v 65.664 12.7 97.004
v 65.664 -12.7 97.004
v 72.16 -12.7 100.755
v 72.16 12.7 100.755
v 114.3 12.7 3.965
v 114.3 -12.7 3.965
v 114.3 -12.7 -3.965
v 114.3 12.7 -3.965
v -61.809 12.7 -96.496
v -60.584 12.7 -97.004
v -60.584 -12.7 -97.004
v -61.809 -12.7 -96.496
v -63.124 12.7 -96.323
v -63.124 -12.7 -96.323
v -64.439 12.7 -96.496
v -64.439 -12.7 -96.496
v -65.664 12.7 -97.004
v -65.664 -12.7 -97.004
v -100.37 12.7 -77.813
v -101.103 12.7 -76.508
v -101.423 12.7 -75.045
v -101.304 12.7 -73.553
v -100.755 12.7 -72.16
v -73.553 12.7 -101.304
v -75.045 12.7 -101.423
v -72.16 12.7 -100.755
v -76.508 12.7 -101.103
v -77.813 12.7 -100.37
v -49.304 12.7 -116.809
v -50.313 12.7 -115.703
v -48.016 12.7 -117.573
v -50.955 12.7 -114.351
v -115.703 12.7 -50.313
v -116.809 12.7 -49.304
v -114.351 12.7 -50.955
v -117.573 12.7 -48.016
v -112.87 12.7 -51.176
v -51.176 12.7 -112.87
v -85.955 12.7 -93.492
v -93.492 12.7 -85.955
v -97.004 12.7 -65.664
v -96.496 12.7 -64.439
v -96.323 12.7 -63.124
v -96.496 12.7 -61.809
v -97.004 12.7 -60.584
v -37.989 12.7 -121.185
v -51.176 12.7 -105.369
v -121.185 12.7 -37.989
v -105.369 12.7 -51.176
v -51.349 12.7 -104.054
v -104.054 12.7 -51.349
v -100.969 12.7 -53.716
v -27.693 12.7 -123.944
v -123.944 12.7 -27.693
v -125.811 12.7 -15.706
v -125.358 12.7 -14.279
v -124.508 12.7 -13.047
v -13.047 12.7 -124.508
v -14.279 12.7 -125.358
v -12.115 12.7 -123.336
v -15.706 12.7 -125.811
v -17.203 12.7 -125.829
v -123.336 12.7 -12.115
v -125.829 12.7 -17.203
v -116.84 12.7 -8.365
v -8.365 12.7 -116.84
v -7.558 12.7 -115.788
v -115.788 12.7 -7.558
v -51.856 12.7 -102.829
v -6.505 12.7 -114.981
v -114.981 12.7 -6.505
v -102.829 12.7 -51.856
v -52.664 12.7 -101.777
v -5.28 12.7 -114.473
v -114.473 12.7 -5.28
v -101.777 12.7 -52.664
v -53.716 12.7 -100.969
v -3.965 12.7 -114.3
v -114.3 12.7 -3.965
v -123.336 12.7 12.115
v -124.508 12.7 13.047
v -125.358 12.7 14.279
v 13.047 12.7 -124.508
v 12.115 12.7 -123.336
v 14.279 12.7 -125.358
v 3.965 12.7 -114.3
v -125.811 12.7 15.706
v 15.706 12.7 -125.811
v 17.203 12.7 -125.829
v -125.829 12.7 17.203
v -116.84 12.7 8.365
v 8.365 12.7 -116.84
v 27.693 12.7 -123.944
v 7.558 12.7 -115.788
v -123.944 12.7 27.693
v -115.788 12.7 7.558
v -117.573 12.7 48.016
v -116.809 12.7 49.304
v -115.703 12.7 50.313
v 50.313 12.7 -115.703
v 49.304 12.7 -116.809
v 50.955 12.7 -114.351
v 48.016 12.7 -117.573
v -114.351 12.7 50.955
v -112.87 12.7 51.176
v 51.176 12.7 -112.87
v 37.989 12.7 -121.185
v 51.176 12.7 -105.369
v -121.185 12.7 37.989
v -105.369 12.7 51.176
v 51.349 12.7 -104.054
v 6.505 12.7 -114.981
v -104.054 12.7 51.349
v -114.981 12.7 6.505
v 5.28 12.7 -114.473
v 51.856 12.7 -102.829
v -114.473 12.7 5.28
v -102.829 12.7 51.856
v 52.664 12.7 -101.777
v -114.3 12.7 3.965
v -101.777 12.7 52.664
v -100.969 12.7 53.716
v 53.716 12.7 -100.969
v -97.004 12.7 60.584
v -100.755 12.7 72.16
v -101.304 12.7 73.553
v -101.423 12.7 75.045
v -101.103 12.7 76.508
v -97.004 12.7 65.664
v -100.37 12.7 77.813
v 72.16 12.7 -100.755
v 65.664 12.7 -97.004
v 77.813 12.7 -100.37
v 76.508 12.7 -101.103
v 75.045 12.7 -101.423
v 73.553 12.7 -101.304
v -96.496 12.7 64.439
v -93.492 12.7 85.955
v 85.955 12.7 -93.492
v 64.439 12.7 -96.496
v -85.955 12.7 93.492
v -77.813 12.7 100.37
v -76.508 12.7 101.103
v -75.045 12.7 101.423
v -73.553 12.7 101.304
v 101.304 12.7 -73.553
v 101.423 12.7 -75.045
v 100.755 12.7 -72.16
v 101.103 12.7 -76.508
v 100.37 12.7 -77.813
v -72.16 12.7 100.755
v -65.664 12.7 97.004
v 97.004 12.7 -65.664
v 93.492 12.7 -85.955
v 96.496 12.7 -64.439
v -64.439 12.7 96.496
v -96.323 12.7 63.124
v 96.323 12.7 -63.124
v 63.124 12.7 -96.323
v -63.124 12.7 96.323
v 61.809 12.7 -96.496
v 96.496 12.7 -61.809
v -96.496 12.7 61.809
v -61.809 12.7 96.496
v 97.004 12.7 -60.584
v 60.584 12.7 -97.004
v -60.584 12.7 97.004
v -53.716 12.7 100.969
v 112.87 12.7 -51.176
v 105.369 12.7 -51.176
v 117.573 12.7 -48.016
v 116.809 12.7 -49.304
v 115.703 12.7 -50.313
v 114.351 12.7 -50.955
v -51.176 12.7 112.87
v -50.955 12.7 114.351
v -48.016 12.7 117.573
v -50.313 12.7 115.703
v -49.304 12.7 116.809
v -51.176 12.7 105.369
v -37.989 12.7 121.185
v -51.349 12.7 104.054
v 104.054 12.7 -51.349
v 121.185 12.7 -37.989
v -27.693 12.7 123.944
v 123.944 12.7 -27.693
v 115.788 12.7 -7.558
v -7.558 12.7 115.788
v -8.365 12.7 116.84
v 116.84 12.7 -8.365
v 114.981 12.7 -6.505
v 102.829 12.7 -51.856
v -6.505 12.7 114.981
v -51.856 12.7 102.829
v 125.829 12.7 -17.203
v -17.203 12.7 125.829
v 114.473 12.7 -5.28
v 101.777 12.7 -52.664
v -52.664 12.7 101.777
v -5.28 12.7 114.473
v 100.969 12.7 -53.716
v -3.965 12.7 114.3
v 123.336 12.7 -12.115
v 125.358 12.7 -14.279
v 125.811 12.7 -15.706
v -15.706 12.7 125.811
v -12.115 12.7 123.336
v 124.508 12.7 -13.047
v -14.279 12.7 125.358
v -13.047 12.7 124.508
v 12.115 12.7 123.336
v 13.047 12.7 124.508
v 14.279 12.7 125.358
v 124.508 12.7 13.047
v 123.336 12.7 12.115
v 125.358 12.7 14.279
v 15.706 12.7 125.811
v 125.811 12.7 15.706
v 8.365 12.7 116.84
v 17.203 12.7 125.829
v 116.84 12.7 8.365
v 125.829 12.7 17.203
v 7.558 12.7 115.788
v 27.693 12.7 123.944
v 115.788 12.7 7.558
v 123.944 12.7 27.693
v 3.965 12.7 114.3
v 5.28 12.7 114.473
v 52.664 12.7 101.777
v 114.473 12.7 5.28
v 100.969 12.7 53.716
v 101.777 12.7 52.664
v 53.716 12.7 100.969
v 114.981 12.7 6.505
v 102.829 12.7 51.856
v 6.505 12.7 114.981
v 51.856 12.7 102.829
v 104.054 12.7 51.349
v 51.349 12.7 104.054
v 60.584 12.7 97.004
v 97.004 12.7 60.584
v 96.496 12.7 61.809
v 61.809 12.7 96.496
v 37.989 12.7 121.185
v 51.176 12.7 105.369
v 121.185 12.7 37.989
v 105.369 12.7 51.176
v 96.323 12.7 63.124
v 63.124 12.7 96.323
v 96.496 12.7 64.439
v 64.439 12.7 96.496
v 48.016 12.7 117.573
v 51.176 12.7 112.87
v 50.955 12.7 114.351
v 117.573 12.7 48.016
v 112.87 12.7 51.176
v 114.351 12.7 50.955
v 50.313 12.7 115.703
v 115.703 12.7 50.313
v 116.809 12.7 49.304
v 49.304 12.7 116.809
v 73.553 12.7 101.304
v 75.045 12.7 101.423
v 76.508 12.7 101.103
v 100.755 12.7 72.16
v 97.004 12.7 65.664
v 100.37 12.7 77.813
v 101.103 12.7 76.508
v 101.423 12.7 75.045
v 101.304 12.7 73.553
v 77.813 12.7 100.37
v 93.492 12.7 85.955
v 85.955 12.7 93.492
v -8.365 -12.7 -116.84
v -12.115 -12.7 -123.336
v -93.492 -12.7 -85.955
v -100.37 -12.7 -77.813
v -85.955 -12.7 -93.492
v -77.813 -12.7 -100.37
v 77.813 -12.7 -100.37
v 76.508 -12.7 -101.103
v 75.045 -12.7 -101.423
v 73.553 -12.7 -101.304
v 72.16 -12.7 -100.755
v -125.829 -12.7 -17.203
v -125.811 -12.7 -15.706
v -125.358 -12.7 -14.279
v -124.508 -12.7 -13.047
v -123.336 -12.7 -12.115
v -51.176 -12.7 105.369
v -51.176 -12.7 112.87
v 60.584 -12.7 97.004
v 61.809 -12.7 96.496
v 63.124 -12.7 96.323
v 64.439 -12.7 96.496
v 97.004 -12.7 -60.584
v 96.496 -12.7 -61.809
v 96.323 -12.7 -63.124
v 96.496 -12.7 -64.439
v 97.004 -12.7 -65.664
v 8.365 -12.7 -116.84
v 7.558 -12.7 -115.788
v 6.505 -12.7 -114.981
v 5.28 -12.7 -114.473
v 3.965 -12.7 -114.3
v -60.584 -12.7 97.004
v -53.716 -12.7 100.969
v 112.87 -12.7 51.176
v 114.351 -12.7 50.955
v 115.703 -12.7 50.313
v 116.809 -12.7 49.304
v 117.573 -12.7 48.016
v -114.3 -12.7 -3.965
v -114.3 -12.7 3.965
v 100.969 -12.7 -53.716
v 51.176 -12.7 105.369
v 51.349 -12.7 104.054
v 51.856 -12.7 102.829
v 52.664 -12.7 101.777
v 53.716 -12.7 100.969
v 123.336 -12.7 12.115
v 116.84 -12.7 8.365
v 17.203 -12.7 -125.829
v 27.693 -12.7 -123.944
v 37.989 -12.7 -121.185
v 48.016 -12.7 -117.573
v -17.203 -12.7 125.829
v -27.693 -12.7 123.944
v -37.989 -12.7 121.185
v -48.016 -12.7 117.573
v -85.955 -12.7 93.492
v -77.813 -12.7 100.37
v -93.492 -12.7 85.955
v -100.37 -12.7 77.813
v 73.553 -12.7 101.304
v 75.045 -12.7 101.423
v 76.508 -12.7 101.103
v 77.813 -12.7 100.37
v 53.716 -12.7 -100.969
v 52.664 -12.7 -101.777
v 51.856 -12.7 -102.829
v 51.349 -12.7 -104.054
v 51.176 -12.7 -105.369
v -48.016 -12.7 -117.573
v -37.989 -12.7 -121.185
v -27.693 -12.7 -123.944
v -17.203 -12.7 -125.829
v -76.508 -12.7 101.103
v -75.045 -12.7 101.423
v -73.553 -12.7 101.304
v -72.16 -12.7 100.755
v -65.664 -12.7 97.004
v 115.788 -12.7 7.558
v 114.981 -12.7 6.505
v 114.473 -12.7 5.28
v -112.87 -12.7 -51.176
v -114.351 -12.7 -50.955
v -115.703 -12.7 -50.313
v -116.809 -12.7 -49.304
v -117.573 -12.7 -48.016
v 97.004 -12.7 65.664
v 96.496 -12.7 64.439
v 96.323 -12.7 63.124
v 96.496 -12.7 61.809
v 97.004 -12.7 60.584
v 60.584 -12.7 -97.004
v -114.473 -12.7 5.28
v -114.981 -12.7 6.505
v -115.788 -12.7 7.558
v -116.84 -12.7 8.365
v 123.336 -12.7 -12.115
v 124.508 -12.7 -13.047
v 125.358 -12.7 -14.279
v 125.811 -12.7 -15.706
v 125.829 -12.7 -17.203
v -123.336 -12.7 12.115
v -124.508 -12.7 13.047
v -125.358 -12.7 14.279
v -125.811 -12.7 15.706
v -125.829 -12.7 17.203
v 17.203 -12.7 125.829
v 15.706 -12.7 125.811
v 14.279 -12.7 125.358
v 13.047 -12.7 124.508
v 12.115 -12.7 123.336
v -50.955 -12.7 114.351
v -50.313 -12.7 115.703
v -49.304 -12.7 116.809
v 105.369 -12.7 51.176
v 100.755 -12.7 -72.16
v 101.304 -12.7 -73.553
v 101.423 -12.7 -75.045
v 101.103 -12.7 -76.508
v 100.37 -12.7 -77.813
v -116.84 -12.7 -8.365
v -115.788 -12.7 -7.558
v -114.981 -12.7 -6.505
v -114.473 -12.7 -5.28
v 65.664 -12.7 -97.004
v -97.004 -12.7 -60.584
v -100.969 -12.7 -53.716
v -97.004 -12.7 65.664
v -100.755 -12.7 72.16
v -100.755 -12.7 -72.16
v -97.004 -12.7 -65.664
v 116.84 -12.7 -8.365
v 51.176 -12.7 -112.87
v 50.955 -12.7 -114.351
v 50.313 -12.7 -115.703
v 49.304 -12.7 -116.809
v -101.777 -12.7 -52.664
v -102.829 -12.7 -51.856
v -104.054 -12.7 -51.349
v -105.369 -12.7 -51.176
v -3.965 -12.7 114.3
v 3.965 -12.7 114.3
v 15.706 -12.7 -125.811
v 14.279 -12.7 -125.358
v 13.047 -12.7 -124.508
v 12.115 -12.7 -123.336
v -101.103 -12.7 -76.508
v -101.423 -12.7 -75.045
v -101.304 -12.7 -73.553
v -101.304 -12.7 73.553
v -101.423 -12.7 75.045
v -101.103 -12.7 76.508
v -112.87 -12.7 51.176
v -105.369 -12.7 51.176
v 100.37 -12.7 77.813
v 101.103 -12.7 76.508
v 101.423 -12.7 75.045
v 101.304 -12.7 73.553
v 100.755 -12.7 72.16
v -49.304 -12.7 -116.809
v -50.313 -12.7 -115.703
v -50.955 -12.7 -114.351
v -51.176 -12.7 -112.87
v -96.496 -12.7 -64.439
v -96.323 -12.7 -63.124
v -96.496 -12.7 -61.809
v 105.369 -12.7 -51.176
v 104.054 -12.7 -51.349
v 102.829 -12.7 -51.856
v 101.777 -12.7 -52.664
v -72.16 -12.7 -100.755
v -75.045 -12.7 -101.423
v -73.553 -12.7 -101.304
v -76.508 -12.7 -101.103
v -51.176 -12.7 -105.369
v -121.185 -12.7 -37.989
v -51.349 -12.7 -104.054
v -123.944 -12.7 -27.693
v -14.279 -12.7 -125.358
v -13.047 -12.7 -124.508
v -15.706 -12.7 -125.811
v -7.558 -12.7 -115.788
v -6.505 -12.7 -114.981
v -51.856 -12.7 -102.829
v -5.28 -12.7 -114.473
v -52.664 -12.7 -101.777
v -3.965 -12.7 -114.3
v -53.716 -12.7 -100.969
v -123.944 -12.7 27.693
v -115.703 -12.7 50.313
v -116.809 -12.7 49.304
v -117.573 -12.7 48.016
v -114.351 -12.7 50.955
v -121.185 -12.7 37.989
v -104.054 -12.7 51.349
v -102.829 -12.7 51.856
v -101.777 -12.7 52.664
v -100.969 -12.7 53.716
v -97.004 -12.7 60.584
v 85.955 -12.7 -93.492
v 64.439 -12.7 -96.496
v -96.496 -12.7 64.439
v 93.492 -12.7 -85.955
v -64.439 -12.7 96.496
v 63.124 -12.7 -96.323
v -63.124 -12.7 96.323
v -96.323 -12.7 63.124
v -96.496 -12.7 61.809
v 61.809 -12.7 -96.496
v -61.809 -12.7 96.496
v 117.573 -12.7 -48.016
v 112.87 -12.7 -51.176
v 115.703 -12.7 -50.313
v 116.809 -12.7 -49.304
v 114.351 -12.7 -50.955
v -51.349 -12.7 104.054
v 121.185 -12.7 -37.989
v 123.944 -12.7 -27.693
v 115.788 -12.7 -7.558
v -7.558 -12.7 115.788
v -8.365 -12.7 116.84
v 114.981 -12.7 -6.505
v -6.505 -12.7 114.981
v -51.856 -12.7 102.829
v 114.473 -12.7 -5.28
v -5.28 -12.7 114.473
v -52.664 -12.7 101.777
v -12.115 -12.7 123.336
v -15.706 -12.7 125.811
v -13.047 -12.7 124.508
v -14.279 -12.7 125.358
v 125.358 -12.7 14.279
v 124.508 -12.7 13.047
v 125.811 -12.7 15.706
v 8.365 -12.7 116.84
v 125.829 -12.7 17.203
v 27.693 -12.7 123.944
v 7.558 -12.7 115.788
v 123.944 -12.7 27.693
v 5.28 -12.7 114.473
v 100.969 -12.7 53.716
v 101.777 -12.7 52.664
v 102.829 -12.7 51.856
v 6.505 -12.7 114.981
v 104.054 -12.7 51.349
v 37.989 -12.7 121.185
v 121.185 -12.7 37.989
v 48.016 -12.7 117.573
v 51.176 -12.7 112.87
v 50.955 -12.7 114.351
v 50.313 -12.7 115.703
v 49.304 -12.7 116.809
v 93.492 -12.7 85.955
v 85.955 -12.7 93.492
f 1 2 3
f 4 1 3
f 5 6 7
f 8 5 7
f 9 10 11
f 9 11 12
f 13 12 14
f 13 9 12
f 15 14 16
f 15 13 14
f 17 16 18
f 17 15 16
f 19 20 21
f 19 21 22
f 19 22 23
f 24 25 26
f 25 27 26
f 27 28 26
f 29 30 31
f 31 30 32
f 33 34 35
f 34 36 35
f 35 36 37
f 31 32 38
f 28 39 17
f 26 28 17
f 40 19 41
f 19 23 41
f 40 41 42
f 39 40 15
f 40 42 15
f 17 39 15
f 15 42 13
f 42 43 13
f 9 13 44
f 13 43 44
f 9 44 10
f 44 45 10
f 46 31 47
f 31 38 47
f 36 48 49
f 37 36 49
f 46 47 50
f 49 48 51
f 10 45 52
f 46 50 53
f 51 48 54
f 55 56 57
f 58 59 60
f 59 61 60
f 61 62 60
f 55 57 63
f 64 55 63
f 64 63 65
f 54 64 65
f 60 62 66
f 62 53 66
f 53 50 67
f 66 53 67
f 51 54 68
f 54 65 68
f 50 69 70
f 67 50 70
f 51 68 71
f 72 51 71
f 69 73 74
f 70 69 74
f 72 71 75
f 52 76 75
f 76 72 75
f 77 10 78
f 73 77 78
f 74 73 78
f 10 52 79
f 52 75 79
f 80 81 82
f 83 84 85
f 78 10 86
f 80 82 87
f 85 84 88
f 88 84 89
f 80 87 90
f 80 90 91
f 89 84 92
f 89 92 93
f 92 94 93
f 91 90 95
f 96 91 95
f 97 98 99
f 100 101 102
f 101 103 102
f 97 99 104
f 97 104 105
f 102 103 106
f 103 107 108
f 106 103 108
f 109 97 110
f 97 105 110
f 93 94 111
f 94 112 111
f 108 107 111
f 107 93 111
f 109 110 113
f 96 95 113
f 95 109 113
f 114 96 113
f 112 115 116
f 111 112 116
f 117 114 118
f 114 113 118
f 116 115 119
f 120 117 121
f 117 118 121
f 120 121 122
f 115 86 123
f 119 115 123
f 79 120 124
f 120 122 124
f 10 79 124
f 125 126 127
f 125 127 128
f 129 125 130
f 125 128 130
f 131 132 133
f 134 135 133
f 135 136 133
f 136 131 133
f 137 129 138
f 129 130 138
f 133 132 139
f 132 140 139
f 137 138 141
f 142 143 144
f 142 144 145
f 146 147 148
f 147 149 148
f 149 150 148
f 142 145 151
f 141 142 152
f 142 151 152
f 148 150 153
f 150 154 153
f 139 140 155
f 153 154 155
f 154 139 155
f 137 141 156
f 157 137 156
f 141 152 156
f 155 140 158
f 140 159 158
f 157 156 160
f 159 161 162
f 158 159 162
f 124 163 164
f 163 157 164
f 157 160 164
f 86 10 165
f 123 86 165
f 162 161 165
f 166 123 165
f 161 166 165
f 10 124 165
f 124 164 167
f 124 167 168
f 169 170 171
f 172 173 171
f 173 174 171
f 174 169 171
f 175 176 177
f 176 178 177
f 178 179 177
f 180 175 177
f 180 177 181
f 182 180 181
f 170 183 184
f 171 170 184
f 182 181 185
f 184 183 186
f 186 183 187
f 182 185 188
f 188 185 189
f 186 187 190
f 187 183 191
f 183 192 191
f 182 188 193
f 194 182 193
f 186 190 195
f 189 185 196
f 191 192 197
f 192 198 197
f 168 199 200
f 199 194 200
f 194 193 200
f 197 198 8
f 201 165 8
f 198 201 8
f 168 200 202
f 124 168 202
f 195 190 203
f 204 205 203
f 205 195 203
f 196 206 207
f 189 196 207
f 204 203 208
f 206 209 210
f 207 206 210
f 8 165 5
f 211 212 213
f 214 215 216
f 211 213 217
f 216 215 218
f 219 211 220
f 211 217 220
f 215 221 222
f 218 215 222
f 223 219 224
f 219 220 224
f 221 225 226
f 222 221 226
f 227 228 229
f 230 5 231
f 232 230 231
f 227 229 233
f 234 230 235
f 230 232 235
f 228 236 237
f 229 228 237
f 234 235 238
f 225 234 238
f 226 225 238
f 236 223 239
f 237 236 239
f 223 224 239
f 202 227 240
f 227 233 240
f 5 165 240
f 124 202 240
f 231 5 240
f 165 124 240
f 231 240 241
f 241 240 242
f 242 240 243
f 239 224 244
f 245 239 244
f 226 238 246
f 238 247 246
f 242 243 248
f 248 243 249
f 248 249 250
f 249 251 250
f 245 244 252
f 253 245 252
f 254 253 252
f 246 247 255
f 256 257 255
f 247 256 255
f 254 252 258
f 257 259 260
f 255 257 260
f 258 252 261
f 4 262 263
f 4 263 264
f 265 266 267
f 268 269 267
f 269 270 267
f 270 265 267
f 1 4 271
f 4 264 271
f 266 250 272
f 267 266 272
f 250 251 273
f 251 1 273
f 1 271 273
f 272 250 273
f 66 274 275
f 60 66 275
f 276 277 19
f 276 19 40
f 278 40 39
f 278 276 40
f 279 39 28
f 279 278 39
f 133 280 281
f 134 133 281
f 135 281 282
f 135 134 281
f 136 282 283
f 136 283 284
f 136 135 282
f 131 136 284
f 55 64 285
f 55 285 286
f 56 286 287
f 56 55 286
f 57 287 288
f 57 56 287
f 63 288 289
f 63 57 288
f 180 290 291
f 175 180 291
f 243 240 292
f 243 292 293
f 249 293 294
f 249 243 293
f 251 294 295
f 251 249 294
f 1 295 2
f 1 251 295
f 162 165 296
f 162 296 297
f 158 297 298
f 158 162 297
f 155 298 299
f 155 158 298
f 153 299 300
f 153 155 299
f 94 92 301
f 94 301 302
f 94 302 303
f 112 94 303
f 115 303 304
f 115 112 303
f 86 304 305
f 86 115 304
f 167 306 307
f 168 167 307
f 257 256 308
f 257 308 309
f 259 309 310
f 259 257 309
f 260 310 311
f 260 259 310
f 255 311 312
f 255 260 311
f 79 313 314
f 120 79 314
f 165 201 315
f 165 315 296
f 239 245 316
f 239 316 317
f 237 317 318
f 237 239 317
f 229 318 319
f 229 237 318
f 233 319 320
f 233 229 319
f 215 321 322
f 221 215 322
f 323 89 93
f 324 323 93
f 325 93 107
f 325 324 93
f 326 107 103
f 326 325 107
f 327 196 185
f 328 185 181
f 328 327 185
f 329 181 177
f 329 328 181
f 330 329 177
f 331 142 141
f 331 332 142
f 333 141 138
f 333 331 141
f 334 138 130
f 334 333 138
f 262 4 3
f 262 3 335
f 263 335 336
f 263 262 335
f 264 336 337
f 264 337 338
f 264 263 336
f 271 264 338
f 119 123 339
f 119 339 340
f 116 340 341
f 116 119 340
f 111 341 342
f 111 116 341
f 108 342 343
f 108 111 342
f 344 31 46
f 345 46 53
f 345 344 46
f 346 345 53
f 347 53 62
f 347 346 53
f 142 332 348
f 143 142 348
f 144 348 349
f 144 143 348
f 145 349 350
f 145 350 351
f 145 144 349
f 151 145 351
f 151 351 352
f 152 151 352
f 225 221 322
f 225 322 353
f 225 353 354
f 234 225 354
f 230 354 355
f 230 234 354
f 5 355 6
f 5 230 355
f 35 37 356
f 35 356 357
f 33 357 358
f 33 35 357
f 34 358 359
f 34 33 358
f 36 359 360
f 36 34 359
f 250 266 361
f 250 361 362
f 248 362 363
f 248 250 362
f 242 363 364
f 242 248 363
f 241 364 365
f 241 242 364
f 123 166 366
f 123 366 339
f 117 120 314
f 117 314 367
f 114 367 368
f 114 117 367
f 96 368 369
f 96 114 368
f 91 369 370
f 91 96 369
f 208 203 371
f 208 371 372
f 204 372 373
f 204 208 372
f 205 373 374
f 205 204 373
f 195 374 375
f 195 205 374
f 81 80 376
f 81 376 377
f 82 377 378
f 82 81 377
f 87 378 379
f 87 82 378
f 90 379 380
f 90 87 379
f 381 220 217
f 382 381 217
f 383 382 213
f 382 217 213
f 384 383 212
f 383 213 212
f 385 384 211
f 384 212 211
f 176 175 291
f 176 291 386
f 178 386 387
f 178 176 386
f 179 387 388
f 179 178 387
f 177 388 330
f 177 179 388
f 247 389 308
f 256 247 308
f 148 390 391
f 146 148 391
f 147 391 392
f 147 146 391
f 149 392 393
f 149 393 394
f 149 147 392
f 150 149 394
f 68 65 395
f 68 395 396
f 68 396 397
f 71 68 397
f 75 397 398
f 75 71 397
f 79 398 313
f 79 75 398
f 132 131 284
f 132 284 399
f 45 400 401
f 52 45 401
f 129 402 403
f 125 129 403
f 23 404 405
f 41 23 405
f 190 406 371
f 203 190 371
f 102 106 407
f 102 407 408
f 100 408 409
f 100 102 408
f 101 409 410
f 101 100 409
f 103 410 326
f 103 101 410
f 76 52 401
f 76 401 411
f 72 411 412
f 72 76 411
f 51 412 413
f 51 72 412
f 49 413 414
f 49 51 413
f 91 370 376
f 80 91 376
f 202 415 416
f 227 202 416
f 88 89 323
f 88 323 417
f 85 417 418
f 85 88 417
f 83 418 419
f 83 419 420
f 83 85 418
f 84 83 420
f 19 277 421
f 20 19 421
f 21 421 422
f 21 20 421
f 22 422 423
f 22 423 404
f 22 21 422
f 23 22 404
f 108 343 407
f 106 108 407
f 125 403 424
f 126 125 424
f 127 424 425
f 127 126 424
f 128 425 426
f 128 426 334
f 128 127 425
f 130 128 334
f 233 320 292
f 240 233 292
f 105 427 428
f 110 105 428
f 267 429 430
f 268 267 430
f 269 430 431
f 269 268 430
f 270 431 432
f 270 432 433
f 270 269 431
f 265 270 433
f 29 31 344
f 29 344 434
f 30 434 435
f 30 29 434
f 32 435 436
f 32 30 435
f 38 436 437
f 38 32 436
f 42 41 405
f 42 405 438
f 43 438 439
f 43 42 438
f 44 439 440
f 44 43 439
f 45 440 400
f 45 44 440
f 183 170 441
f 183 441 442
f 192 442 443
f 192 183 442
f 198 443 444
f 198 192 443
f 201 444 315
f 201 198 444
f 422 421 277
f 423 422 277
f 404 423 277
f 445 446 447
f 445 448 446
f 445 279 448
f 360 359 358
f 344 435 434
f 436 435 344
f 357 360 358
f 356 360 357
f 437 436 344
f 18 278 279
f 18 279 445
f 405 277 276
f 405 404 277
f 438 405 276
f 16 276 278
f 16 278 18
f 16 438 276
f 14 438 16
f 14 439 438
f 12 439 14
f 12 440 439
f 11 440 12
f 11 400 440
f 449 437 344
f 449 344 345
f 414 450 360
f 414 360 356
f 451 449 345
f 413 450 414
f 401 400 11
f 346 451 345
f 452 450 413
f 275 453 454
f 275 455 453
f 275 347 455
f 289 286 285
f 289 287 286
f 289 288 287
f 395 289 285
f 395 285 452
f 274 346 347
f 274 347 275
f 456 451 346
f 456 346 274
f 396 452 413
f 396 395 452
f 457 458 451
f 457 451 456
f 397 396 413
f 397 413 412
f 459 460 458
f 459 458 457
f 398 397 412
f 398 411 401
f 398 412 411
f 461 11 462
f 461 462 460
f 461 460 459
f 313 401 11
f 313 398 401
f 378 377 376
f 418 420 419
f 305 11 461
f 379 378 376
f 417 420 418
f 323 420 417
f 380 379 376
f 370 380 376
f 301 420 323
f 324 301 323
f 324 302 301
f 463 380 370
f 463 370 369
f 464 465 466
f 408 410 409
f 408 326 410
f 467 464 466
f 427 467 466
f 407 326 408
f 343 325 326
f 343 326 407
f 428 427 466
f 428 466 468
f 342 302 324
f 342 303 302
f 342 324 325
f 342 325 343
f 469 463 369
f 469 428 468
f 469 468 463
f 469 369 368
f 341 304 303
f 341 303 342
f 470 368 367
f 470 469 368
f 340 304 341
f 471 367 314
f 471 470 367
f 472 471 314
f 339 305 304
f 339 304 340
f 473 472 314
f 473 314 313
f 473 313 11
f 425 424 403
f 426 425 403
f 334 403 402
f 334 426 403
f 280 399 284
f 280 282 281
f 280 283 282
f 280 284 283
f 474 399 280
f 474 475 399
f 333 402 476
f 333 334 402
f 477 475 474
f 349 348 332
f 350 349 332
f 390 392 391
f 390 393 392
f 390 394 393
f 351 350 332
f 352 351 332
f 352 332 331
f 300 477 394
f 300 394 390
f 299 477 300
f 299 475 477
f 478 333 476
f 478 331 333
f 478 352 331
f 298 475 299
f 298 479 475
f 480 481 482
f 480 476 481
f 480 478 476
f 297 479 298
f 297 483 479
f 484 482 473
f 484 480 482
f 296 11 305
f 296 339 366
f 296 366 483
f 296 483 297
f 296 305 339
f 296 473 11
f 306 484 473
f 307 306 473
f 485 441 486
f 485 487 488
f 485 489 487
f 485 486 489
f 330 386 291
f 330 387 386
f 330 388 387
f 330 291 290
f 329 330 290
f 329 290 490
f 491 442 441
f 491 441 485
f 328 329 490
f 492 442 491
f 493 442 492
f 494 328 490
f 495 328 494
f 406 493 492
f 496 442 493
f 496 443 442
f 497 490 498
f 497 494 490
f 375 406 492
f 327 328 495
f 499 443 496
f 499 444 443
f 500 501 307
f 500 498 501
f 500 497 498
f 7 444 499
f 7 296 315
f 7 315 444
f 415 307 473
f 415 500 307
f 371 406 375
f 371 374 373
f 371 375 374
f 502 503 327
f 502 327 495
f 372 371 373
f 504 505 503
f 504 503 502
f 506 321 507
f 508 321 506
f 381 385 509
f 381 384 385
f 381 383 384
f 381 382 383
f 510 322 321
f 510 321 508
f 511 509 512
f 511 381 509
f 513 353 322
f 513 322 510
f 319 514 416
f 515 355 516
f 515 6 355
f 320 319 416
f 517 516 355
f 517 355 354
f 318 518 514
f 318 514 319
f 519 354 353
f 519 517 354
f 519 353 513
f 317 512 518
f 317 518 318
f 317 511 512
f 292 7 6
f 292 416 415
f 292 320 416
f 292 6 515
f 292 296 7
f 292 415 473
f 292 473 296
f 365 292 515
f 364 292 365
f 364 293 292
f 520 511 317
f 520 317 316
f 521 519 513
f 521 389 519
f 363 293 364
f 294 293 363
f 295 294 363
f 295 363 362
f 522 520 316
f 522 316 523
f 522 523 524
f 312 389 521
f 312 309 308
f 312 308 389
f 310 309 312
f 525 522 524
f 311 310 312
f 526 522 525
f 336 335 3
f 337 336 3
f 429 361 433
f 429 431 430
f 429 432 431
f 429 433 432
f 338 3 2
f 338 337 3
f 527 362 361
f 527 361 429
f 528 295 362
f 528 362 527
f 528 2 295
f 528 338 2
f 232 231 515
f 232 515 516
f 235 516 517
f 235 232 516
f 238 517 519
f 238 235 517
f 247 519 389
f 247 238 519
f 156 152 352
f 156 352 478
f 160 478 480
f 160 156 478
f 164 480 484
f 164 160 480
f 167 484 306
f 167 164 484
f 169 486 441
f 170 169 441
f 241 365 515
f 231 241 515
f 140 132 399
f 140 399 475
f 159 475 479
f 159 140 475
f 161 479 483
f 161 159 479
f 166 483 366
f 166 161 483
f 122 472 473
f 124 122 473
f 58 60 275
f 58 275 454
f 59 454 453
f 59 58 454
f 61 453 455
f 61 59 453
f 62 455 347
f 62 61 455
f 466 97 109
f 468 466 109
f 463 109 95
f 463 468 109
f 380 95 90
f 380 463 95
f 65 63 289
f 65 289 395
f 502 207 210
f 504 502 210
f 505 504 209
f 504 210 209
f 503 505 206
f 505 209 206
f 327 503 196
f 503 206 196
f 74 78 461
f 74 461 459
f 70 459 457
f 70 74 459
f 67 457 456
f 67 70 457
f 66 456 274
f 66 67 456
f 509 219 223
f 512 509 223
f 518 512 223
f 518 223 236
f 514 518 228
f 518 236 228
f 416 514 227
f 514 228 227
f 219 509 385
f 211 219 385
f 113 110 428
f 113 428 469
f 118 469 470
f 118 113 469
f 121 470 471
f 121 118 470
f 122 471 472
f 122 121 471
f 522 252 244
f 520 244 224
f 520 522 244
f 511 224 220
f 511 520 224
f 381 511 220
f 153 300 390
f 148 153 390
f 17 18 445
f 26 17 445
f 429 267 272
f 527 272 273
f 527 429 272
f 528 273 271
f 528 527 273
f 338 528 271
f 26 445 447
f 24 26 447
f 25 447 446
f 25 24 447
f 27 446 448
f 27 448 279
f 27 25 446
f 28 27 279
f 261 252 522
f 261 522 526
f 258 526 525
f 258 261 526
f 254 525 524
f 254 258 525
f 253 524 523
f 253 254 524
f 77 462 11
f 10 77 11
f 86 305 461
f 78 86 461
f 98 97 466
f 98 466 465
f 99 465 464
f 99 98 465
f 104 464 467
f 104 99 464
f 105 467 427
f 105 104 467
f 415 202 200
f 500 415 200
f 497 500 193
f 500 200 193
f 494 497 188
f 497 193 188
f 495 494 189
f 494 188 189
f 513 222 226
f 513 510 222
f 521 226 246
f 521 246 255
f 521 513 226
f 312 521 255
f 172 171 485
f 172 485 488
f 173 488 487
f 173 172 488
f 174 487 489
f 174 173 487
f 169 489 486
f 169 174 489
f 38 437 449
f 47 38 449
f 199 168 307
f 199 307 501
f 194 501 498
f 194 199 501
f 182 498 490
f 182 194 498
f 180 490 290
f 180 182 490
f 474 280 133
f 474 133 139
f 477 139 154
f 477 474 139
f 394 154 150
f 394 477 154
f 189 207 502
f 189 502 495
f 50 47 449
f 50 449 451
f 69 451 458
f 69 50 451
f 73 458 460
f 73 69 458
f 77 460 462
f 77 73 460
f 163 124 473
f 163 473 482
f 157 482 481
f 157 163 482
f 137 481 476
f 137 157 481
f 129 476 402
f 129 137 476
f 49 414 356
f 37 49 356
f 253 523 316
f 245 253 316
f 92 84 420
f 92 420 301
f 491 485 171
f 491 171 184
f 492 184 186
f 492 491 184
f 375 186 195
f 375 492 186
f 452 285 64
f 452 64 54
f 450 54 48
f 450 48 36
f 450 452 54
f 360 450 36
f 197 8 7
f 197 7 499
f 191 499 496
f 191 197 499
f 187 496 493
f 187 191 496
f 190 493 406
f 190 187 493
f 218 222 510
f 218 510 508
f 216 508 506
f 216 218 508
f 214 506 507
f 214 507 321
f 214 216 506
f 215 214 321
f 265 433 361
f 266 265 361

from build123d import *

# Parameters (mm, degrees)
F0_R            = 127
F1_DEPTH        = 12.7
F3_DEPTH        = 12.701
F3_DEPTH_BACK   = 12.701
F3_COPIES_COUNT = 12
F4_T1_DEPTH     = 25.4
F4_T3_DEPTH     = 42.5595323233


# Not quite as in the source:
# - a fillet or chamfer that OpenCascade refuses, or shapes differently, is made with other operations: its cross-section is extruded or revolved along the edge and cut away or added
# - a feature of the source that left no trace in its solid (it failed there, or was rolled back) is left out
# - a pattern or mirror of a feature is missing from the dataset's text; its kind, count and spacing are read off the source's solid


with BuildPart() as f1:
    # F0 (on Front) → F1 (new body, symmetric)
    with BuildSketch(Plane.XZ):
        Circle(F0_R)
    extrude(amount=F1_DEPTH, both=True)

    # F2 (on Front) → F3 (cut, two sides)
    with BuildSketch(Plane.XZ) as f3_sk:
        with BuildLine():
            Line((0, 114.3), (6.8983899217, 114.3))
            Line((6.8983899217, 114.3), (13.7967798433, 126.2483618347))
            ThreePointArc((13.7967798433, 126.2483618347), (0, 127), (-13.7967798433, 126.2483618347))
            Line((-13.7967798433, 126.2483618347), (-6.8983899217, 114.3))
            Line((-6.8983899217, 114.3), (0, 114.3))
        make_face()
    f3 = extrude(amount=-F3_DEPTH, mode=Mode.SUBTRACT) + extrude(f3_sk.sketch, amount=F3_DEPTH_BACK, mode=Mode.SUBTRACT)

    # F3_copies: F3 ×12 about axis
    f3_copies_axis = Axis((0, 0, 0), (0, 1, 0))
    for i in range(1, F3_COPIES_COUNT):
        add(f3.rotate(f3_copies_axis, i * 360 / F3_COPIES_COUNT), mode=Mode.SUBTRACT)

    # F4: fillet of radius 5.08 on 48 edges, made by hand

    # F4_s2 → F4_t1 (join)
    with BuildSketch(Plane.XZ.offset(-12.7)):
        with BuildLine():
            ThreePointArc((8.3648596054, 116.84), (6.5054505542, 114.9805909488), (3.9654505542, 114.3))
            Line((3.9654505542, 114.3), (6.8983899217, 114.3))
            Line((6.8983899217, 114.3), (8.3648596054, 116.84))
        make_face()
        with BuildLine():
            ThreePointArc((-3.9654505542, 114.3), (-6.5054505542, 114.9805909488), (-8.3648596054, 116.84))
            Line((-8.3648596054, 116.84), (-6.8983899217, 114.3))
            Line((-6.8983899217, 114.3), (-3.9654505542, 114.3))
        make_face()
        with BuildLine():
            ThreePointArc((51.1758190826, 105.3688379809), (51.8564100314, 102.8288379809), (53.7158190826, 100.9694289297))
            Line((53.7158190826, 100.9694289297), (51.1758190826, 102.4358986134))
            Line((51.1758190826, 102.4358986134), (51.1758190826, 105.3688379809))
        make_face()
        with BuildLine():
            ThreePointArc((60.5841809174, 97.0039783755), (63.1241809174, 96.3233874267), (65.6641809174, 97.0039783755))
            Line((65.6641809174, 97.0039783755), (63.1241809174, 95.5375086917))
            Line((63.1241809174, 95.5375086917), (60.5841809174, 97.0039783755))
        make_face()
        with BuildLine():
            ThreePointArc((97.0039783755, 65.6641809174), (96.3233874267, 63.1241809174), (97.0039783755, 60.5841809174))
            Line((97.0039783755, 60.5841809174), (95.5375086917, 63.1241809174))
            Line((95.5375086917, 63.1241809174), (97.0039783755, 65.6641809174))
        make_face()
        with BuildLine():
            ThreePointArc((100.9694289297, 53.7158190826), (102.8288379809, 51.8564100314), (105.3688379809, 51.1758190826))
            Line((105.3688379809, 51.1758190826), (102.4358986134, 51.1758190826))
            Line((102.4358986134, 51.1758190826), (100.9694289297, 53.7158190826))
        make_face()
        with BuildLine():
            ThreePointArc((116.84, 8.3648596054), (114.9805909488, 6.5054505542), (114.3, 3.9654505542))
            Line((114.3, 3.9654505542), (114.3, 6.8983899217))
            Line((114.3, 6.8983899217), (116.84, 8.3648596054))
        make_face()
        with BuildLine():
            ThreePointArc((114.3, -3.9654505542), (114.9805909488, -6.5054505542), (116.84, -8.3648596054))
            Line((116.84, -8.3648596054), (114.3, -6.8983899217))
            Line((114.3, -6.8983899217), (114.3, -3.9654505542))
        make_face()
        with BuildLine():
            ThreePointArc((105.3688379809, -51.1758190826), (102.8288379809, -51.8564100314), (100.9694289297, -53.7158190826))
            Line((100.9694289297, -53.7158190826), (102.4358986134, -51.1758190826))
            Line((102.4358986134, -51.1758190826), (105.3688379809, -51.1758190826))
        make_face()
        with BuildLine():
            ThreePointArc((97.0039783755, -60.5841809174), (96.3233874267, -63.1241809174), (97.0039783755, -65.6641809174))
            Line((97.0039783755, -65.6641809174), (95.5375086917, -63.1241809174))
            Line((95.5375086917, -63.1241809174), (97.0039783755, -60.5841809174))
        make_face()
        with BuildLine():
            ThreePointArc((65.6641809174, -97.0039783755), (63.1241809174, -96.3233874267), (60.5841809174, -97.0039783755))
            Line((60.5841809174, -97.0039783755), (63.1241809174, -95.5375086917))
            Line((63.1241809174, -95.5375086917), (65.6641809174, -97.0039783755))
        make_face()
        with BuildLine():
            ThreePointArc((53.7158190826, -100.9694289297), (51.8564100314, -102.8288379809), (51.1758190826, -105.3688379809))
            Line((51.1758190826, -105.3688379809), (51.1758190826, -102.4358986134))
            Line((51.1758190826, -102.4358986134), (53.7158190826, -100.9694289297))
        make_face()
        with BuildLine():
            ThreePointArc((8.3648596054, -116.84), (6.5054505542, -114.9805909488), (3.9654505542, -114.3))
            Line((3.9654505542, -114.3), (6.8983899217, -114.3))
            Line((6.8983899217, -114.3), (8.3648596054, -116.84))
        make_face()
        with BuildLine():
            ThreePointArc((-3.9654505542, -114.3), (-6.5054505542, -114.9805909488), (-8.3648596054, -116.84))
            Line((-8.3648596054, -116.84), (-6.8983899217, -114.3))
            Line((-6.8983899217, -114.3), (-3.9654505542, -114.3))
        make_face()
        with BuildLine():
            ThreePointArc((-51.1758190826, -105.3688379809), (-51.8564100314, -102.8288379809), (-53.7158190826, -100.9694289297))
            Line((-53.7158190826, -100.9694289297), (-51.1758190826, -102.4358986134))
            Line((-51.1758190826, -102.4358986134), (-51.1758190826, -105.3688379809))
        make_face()
        with BuildLine():
            ThreePointArc((-60.5841809174, -97.0039783755), (-63.1241809174, -96.3233874267), (-65.6641809174, -97.0039783755))
            Line((-65.6641809174, -97.0039783755), (-63.1241809174, -95.5375086917))
            Line((-63.1241809174, -95.5375086917), (-60.5841809174, -97.0039783755))
        make_face()
        with BuildLine():
            ThreePointArc((-97.0039783755, -65.6641809174), (-96.3233874267, -63.1241809174), (-97.0039783755, -60.5841809174))
            Line((-97.0039783755, -60.5841809174), (-95.5375086917, -63.1241809174))
            Line((-95.5375086917, -63.1241809174), (-97.0039783755, -65.6641809174))
        make_face()
        with BuildLine():
            ThreePointArc((-100.9694289297, -53.7158190826), (-102.8288379809, -51.8564100314), (-105.3688379809, -51.1758190826))
            Line((-105.3688379809, -51.1758190826), (-102.4358986134, -51.1758190826))
            Line((-102.4358986134, -51.1758190826), (-100.9694289297, -53.7158190826))
        make_face()
        with BuildLine():
            ThreePointArc((-116.84, -8.3648596054), (-114.9805909488, -6.5054505542), (-114.3, -3.9654505542))
            Line((-114.3, -3.9654505542), (-114.3, -6.8983899217))
            Line((-114.3, -6.8983899217), (-116.84, -8.3648596054))
        make_face()
        with BuildLine():
            ThreePointArc((-114.3, 3.9654505542), (-114.9805909488, 6.5054505542), (-116.84, 8.3648596054))
            Line((-116.84, 8.3648596054), (-114.3, 6.8983899217))
            Line((-114.3, 6.8983899217), (-114.3, 3.9654505542))
        make_face()
        with BuildLine():
            ThreePointArc((-105.3688379809, 51.1758190826), (-102.8288379809, 51.8564100314), (-100.9694289297, 53.7158190826))
            Line((-100.9694289297, 53.7158190826), (-102.4358986134, 51.1758190826))
            Line((-102.4358986134, 51.1758190826), (-105.3688379809, 51.1758190826))
        make_face()
        with BuildLine():
            ThreePointArc((-97.0039783755, 60.5841809174), (-96.3233874267, 63.1241809174), (-97.0039783755, 65.6641809174))
            Line((-97.0039783755, 65.6641809174), (-95.5375086917, 63.1241809174))
            Line((-95.5375086917, 63.1241809174), (-97.0039783755, 60.5841809174))
        make_face()
        with BuildLine():
            ThreePointArc((-65.6641809174, 97.0039783755), (-63.1241809174, 96.3233874267), (-60.5841809174, 97.0039783755))
            Line((-60.5841809174, 97.0039783755), (-63.1241809174, 95.5375086917))
            Line((-63.1241809174, 95.5375086917), (-65.6641809174, 97.0039783755))
        make_face()
        with BuildLine():
            ThreePointArc((-53.7158190826, 100.9694289297), (-51.8564100314, 102.8288379809), (-51.1758190826, 105.3688379809))
            Line((-51.1758190826, 105.3688379809), (-51.1758190826, 102.4358986134))
            Line((-51.1758190826, 102.4358986134), (-53.7158190826, 100.9694289297))
        make_face()
    extrude(amount=F4_T1_DEPTH)

    # F4_s4 → F4_t3 (cut)
    with BuildSketch(Plane.XZ.offset(-21.2797661616)):
        with BuildLine():
            ThreePointArc((17.2030259978, 125.8294714942), (14.2794184599, 125.3579809313), (12.1154959066, 123.3362926345))
            Line((12.1154959066, 123.3362926345), (13.7967798433, 126.2483618347))
            ThreePointArc((13.7967798433, 126.2483618347), (15.5013179384, 126.0504230147), (17.2030259978, 125.8294714942))
        make_face()
        with BuildLine():
            ThreePointArc((-12.1154959066, 123.3362926345), (-14.2794184599, 125.3579809313), (-17.2030259978, 125.8294714942))
            ThreePointArc((-17.2030259978, 125.8294714942), (-15.5013179384, 126.0504230147), (-13.7967798433, 126.2483618347))
            Line((-13.7967798433, 126.2483618347), (-12.1154959066, 123.3362926345))
        make_face()
        with BuildLine():
            ThreePointArc((48.0164782111, 117.5730318577), (50.3126513281, 115.7029052836), (51.1758190826, 112.8701105834))
            Line((51.1758190826, 112.8701105834), (51.1758190826, 116.2326784567))
            ThreePointArc((51.1758190826, 116.2326784567), (49.6006763806, 116.9135274576), (48.0164782111, 117.5730318577))
        make_face()
        with BuildLine():
            ThreePointArc((72.1604735518, 100.7546146767), (75.0453296032, 101.4234868237), (77.8129932832, 100.3700058599))
            ThreePointArc((77.8129932832, 100.3700058599), (76.4497466341, 101.4122095193), (75.0725427521, 102.4358986134))
            Line((75.0725427521, 102.4358986134), (72.1604735518, 100.7546146767))
        make_face()
        with BuildLine():
            ThreePointArc((100.3700058599, 77.8129932832), (101.4234868237, 75.0453296032), (100.7546146767, 72.1604735518))
            Line((100.7546146767, 72.1604735518), (102.4358986134, 75.0725427521))
            ThreePointArc((102.4358986134, 75.0725427521), (101.4122095193, 76.4497466341), (100.3700058599, 77.8129932832))
        make_face()
        with BuildLine():
            ThreePointArc((112.8701105834, 51.1758190826), (115.7029052836, 50.3126513281), (117.5730318577, 48.0164782111))
            ThreePointArc((117.5730318577, 48.0164782111), (116.9135274576, 49.6006763806), (116.2326784567, 51.1758190826))
            Line((116.2326784567, 51.1758190826), (112.8701105834, 51.1758190826))
        make_face()
        with BuildLine():
            ThreePointArc((125.8294714942, 17.2030259978), (125.3579809313, 14.2794184599), (123.3362926345, 12.1154959067))
            Line((123.3362926345, 12.1154959067), (126.2483618347, 13.7967798433))
            ThreePointArc((126.2483618347, 13.7967798433), (126.0504230147, 15.5013179384), (125.8294714942, 17.2030259978))
        make_face()
        with BuildLine():
            ThreePointArc((123.3362926345, -12.1154959066), (125.3579809313, -14.2794184599), (125.8294714942, -17.2030259978))
            ThreePointArc((125.8294714942, -17.2030259978), (126.0504230147, -15.5013179384), (126.2483618347, -13.7967798433))
            Line((126.2483618347, -13.7967798433), (123.3362926345, -12.1154959066))
        make_face()
        with BuildLine():
            ThreePointArc((117.5730318577, -48.0164782111), (115.7029052836, -50.3126513281), (112.8701105834, -51.1758190826))
            Line((112.8701105834, -51.1758190826), (116.2326784567, -51.1758190826))
            ThreePointArc((116.2326784567, -51.1758190826), (116.9135274576, -49.6006763806), (117.5730318577, -48.0164782111))
        make_face()
        with BuildLine():
            ThreePointArc((100.7546146767, -72.1604735518), (101.4234868237, -75.0453296032), (100.3700058599, -77.8129932832))
            ThreePointArc((100.3700058599, -77.8129932832), (101.4122095193, -76.4497466341), (102.4358986134, -75.0725427521))
            Line((102.4358986134, -75.0725427521), (100.7546146767, -72.1604735518))
        make_face()
        with BuildLine():
            ThreePointArc((77.8129932832, -100.3700058599), (75.0453296032, -101.4234868237), (72.1604735518, -100.7546146767))
            Line((72.1604735518, -100.7546146767), (75.0725427521, -102.4358986134))
            ThreePointArc((75.0725427521, -102.4358986134), (76.4497466341, -101.4122095193), (77.8129932832, -100.3700058599))
        make_face()
        with BuildLine():
            ThreePointArc((51.1758190826, -112.8701105834), (50.3126513281, -115.7029052836), (48.0164782111, -117.5730318577))
            ThreePointArc((48.0164782111, -117.5730318577), (49.6006763806, -116.9135274576), (51.1758190826, -116.2326784567))
            Line((51.1758190826, -116.2326784567), (51.1758190826, -112.8701105834))
        make_face()
        with BuildLine():
            ThreePointArc((17.2030259978, -125.8294714942), (14.2794184599, -125.3579809313), (12.1154959067, -123.3362926345))
            Line((12.1154959067, -123.3362926345), (13.7967798433, -126.2483618347))
            ThreePointArc((13.7967798433, -126.2483618347), (15.5013179384, -126.0504230147), (17.2030259978, -125.8294714942))
        make_face()
        with BuildLine():
            ThreePointArc((-12.1154959066, -123.3362926345), (-14.2794184599, -125.3579809313), (-17.2030259978, -125.8294714942))
            ThreePointArc((-17.2030259978, -125.8294714942), (-15.5013179384, -126.0504230147), (-13.7967798433, -126.2483618347))
            Line((-13.7967798433, -126.2483618347), (-12.1154959066, -123.3362926345))
        make_face()
        with BuildLine():
            ThreePointArc((-48.0164782111, -117.5730318577), (-50.3126513281, -115.7029052836), (-51.1758190826, -112.8701105834))
            Line((-51.1758190826, -112.8701105834), (-51.1758190826, -116.2326784567))
            ThreePointArc((-51.1758190826, -116.2326784567), (-49.6006763806, -116.9135274576), (-48.0164782111, -117.5730318577))
        make_face()
        with BuildLine():
            ThreePointArc((-72.1604735518, -100.7546146767), (-75.0453296032, -101.4234868237), (-77.8129932832, -100.3700058599))
            ThreePointArc((-77.8129932832, -100.3700058599), (-76.4497466341, -101.4122095193), (-75.0725427521, -102.4358986134))
            Line((-75.0725427521, -102.4358986134), (-72.1604735518, -100.7546146767))
        make_face()
        with BuildLine():
            ThreePointArc((-100.3700058599, -77.8129932832), (-101.4234868237, -75.0453296032), (-100.7546146767, -72.1604735518))
            Line((-100.7546146767, -72.1604735518), (-102.4358986134, -75.0725427521))
            ThreePointArc((-102.4358986134, -75.0725427521), (-101.4122095193, -76.4497466341), (-100.3700058599, -77.8129932832))
        make_face()
        with BuildLine():
            ThreePointArc((-112.8701105834, -51.1758190826), (-115.7029052836, -50.3126513281), (-117.5730318577, -48.0164782111))
            ThreePointArc((-117.5730318577, -48.0164782111), (-116.9135274576, -49.6006763806), (-116.2326784567, -51.1758190826))
            Line((-116.2326784567, -51.1758190826), (-112.8701105834, -51.1758190826))
        make_face()
        with BuildLine():
            ThreePointArc((-125.8294714942, -17.2030259978), (-125.3579809313, -14.2794184599), (-123.3362926345, -12.1154959066))
            Line((-123.3362926345, -12.1154959066), (-126.2483618347, -13.7967798433))
            ThreePointArc((-126.2483618347, -13.7967798433), (-126.0504230147, -15.5013179384), (-125.8294714942, -17.2030259978))
        make_face()
        with BuildLine():
            ThreePointArc((-123.3362926345, 12.1154959066), (-125.3579809313, 14.2794184599), (-125.8294714942, 17.2030259978))
            ThreePointArc((-125.8294714942, 17.2030259978), (-126.0504230147, 15.5013179384), (-126.2483618347, 13.7967798433))
            Line((-126.2483618347, 13.7967798433), (-123.3362926345, 12.1154959066))
        make_face()
        with BuildLine():
            ThreePointArc((-117.5730318577, 48.0164782111), (-115.7029052836, 50.3126513281), (-112.8701105834, 51.1758190826))
            Line((-112.8701105834, 51.1758190826), (-116.2326784567, 51.1758190826))
            ThreePointArc((-116.2326784567, 51.1758190826), (-116.9135274576, 49.6006763806), (-117.5730318577, 48.0164782111))
        make_face()
        with BuildLine():
            ThreePointArc((-100.7546146767, 72.1604735518), (-101.4234868237, 75.0453296032), (-100.3700058599, 77.8129932832))
            ThreePointArc((-100.3700058599, 77.8129932832), (-101.4122095193, 76.4497466341), (-102.4358986134, 75.0725427521))
            Line((-102.4358986134, 75.0725427521), (-100.7546146767, 72.1604735518))
        make_face()
        with BuildLine():
            ThreePointArc((-77.8129932832, 100.3700058599), (-75.0453296032, 101.4234868237), (-72.1604735518, 100.7546146767))
            Line((-72.1604735518, 100.7546146767), (-75.0725427521, 102.4358986134))
            ThreePointArc((-75.0725427521, 102.4358986134), (-76.4497466341, 101.4122095193), (-77.8129932832, 100.3700058599))
        make_face()
        with BuildLine():
            ThreePointArc((-51.1758190826, 112.8701105834), (-50.3126513281, 115.7029052836), (-48.0164782111, 117.5730318577))
            ThreePointArc((-48.0164782111, 117.5730318577), (-49.6006763806, 116.9135274576), (-51.1758190826, 116.2326784567))
            Line((-51.1758190826, 116.2326784567), (-51.1758190826, 112.8701105834))
        make_face()
    extrude(amount=F4_T3_DEPTH, mode=Mode.SUBTRACT)


solid = f1.part
